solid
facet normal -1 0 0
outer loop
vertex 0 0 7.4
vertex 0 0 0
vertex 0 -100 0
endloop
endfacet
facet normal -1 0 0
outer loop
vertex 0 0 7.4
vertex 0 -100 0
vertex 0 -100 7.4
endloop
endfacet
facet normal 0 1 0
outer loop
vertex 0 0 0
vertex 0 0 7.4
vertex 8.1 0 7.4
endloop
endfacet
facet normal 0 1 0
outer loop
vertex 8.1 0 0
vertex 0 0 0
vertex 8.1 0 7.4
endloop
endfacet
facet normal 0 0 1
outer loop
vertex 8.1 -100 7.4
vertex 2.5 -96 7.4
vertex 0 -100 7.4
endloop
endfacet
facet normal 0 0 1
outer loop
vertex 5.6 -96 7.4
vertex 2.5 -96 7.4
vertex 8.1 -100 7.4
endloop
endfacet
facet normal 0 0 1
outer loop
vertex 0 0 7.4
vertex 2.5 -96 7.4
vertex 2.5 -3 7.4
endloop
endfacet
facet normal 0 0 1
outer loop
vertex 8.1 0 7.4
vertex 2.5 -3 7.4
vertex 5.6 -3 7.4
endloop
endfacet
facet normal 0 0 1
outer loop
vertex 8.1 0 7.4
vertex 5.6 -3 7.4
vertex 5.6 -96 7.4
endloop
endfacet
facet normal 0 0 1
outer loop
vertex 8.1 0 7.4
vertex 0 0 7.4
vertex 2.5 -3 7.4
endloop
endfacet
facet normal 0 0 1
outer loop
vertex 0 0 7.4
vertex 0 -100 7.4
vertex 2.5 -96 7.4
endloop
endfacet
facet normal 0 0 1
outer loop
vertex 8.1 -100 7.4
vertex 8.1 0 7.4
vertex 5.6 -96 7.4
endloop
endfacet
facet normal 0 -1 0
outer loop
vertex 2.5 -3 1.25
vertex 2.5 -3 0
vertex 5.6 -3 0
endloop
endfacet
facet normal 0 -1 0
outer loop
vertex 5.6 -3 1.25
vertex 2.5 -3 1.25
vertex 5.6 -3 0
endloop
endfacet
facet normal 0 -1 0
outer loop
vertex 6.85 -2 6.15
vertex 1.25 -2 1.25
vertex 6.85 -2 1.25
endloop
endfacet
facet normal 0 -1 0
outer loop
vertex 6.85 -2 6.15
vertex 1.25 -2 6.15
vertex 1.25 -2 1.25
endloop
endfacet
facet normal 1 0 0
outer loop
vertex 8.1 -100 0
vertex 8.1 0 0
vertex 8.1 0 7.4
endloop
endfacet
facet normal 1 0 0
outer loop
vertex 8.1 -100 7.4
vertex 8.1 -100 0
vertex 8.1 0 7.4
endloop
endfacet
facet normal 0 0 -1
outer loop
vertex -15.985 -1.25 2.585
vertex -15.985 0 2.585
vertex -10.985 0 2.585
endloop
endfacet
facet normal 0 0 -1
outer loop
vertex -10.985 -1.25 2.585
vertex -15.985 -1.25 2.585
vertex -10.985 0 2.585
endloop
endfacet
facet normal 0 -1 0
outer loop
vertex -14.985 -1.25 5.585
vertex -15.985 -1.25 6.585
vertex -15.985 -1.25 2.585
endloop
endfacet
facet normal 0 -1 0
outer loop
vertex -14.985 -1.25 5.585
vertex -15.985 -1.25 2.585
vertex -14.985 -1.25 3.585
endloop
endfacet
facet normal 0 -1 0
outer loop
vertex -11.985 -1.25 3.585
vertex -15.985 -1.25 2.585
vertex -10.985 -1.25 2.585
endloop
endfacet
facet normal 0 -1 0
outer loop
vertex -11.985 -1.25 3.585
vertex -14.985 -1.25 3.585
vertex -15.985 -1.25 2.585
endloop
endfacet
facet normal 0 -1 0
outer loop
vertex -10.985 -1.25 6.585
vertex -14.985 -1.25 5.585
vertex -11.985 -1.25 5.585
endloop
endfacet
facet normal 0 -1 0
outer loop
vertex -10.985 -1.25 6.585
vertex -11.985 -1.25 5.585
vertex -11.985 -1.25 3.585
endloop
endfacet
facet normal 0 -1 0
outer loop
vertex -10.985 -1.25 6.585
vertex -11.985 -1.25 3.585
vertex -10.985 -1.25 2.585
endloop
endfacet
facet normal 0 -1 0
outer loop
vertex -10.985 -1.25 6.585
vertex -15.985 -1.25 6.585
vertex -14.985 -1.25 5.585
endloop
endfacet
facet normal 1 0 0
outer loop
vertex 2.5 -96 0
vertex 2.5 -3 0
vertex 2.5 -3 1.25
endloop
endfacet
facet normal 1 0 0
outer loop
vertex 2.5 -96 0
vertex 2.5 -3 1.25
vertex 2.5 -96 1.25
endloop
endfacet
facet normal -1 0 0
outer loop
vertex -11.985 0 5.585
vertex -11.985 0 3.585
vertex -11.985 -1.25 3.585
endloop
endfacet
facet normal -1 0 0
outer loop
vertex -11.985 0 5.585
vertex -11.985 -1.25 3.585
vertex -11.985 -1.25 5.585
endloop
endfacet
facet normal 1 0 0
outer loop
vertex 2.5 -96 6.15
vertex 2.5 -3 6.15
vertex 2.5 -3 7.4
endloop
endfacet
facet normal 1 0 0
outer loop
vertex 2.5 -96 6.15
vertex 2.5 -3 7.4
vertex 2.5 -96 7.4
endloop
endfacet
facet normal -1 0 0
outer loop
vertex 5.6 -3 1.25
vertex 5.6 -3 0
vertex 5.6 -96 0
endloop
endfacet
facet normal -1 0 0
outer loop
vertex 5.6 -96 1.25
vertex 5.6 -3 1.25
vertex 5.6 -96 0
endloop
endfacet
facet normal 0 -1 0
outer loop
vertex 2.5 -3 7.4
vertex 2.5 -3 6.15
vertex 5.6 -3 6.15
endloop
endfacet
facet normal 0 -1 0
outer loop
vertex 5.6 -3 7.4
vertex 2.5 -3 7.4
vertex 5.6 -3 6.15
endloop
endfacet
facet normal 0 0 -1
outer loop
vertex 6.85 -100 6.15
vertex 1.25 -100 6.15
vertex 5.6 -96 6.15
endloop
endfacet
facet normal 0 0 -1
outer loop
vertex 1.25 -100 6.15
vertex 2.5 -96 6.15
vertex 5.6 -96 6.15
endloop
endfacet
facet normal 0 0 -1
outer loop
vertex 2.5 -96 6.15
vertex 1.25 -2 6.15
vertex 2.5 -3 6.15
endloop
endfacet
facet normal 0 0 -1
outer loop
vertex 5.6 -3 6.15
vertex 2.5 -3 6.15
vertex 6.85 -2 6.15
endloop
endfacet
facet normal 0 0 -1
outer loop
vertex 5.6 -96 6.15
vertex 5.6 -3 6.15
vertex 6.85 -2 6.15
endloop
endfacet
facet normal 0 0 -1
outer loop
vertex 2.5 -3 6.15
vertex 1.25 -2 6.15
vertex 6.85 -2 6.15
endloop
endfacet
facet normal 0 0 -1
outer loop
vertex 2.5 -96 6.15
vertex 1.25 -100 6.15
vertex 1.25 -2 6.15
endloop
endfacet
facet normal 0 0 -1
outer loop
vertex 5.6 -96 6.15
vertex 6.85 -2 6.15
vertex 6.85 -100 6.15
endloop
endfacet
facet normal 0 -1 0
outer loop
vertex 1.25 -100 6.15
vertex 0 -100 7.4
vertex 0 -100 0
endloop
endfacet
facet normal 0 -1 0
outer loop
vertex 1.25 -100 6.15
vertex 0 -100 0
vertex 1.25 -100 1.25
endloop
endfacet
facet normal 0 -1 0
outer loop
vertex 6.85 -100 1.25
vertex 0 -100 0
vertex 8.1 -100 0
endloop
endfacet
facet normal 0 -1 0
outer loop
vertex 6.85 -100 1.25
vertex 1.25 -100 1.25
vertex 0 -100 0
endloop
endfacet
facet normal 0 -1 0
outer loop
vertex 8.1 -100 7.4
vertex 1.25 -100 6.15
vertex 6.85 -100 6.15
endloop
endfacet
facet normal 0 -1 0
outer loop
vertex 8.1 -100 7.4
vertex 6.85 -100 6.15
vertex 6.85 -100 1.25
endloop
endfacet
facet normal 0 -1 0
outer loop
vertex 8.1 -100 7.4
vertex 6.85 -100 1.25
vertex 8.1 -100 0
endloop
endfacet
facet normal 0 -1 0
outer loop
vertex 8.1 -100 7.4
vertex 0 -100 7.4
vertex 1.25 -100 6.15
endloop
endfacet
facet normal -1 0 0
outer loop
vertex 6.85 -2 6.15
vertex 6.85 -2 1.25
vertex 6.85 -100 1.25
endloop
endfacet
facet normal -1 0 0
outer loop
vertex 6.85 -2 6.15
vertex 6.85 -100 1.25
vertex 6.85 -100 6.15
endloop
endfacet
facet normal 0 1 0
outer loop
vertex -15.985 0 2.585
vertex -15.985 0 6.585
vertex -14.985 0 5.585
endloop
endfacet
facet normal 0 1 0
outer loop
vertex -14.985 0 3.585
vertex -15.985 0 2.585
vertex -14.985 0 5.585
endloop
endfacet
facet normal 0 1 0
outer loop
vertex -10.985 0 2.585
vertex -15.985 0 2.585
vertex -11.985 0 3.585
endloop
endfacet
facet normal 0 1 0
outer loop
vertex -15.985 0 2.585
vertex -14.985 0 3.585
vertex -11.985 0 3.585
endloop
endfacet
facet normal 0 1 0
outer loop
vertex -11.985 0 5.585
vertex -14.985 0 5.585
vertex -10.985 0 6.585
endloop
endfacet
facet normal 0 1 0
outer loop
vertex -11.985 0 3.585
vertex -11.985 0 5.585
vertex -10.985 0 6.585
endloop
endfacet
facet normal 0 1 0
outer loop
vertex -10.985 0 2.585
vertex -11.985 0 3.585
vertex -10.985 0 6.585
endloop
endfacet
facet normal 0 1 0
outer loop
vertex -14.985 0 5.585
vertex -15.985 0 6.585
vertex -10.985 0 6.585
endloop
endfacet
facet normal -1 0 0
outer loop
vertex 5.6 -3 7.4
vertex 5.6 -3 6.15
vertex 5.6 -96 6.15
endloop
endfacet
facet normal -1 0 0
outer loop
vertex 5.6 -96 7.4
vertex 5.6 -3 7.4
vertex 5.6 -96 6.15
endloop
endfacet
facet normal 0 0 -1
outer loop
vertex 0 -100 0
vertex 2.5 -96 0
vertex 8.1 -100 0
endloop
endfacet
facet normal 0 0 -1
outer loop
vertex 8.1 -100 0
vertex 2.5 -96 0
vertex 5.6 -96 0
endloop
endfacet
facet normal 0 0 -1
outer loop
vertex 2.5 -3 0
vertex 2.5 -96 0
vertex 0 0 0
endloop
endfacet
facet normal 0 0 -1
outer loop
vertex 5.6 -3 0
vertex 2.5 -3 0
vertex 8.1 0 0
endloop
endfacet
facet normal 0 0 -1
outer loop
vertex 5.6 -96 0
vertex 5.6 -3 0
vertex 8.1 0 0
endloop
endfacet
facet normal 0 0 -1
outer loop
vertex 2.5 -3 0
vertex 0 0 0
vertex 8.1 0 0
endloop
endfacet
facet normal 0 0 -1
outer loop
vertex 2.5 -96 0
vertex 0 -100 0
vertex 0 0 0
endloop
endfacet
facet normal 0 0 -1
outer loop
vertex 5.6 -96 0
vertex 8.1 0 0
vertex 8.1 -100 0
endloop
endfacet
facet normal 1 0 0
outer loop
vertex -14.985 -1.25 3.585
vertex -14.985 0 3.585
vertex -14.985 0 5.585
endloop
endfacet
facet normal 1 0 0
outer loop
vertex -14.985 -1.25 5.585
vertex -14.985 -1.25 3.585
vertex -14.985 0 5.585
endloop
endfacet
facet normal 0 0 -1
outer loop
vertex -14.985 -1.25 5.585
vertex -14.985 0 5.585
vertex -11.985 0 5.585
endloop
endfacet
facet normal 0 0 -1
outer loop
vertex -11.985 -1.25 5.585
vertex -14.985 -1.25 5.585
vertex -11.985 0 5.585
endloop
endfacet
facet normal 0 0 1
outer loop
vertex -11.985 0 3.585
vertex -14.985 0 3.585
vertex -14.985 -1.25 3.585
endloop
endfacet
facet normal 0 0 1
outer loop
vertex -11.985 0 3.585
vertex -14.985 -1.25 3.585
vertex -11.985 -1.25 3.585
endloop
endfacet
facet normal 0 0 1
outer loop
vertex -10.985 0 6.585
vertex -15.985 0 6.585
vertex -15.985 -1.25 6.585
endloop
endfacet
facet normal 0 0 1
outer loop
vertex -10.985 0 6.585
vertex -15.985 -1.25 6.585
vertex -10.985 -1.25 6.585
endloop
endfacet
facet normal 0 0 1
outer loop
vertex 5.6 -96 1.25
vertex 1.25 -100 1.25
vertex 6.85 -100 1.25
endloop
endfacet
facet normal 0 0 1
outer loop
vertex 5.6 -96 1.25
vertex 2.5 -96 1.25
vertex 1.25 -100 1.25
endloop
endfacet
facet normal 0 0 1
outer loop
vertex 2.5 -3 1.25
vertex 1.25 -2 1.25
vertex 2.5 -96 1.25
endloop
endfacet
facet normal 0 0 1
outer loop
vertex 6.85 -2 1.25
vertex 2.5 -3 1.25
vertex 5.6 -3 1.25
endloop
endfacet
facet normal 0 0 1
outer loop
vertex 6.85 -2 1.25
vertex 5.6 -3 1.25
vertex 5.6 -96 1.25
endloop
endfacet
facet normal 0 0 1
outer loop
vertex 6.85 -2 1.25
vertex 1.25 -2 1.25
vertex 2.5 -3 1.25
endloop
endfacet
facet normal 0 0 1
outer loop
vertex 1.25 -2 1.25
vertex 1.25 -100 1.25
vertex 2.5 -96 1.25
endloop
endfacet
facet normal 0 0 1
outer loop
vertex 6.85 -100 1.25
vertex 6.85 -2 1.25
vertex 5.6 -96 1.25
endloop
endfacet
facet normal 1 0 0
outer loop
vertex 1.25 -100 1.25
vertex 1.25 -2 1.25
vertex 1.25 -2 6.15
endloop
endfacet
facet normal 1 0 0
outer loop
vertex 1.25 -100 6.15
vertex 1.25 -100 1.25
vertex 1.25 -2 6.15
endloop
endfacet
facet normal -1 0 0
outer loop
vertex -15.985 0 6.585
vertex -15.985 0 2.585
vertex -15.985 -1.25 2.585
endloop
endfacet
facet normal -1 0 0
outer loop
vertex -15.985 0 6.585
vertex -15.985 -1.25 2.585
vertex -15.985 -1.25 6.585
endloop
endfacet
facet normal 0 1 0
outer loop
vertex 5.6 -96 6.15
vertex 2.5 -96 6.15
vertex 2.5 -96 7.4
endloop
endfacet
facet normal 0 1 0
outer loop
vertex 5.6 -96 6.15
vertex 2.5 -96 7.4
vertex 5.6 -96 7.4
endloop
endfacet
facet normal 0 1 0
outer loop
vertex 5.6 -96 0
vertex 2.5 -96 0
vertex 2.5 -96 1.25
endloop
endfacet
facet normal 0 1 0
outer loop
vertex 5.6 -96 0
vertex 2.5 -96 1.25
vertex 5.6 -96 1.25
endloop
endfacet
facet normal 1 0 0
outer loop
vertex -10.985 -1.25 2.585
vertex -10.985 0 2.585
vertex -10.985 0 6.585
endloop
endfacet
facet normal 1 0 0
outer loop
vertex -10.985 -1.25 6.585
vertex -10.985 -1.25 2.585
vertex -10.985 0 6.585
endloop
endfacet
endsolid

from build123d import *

# Parameters (mm, degrees)
F0_W     = 8.1
F0_H     = 7.4
F0_W_2   = 5.6
F0_H_2   = 4.9
F1_DEPTH = 2
F2_DEPTH = 100
F3_W     = 3.1
F3_H     = 93
F4_DEPTH = 25
F6_W     = 5
F6_H     = 4
F6_W_2   = 3
F6_H_2   = 2
F7_DEPTH = 1.25


with BuildPart() as f1:
    # F0 (on Front) → F1 (new body)
    with BuildSketch(Plane.XZ):
        with Locations((4.05, 3.7)):
            Rectangle(F0_W, F0_H)
        with Locations((4.05, 3.7)):
            Rectangle(F0_W_2, F0_H_2, mode=Mode.SUBTRACT)
        with Locations((4.05, 3.7)):
            Rectangle(F0_W_2, F0_H_2)
    extrude(amount=F1_DEPTH)

    # F0 (on Front) → F2 (join)
    with BuildSketch(Plane.XZ):
        with Locations((4.05, 3.7)):
            Rectangle(F0_W, F0_H)
        with Locations((4.05, 3.7)):
            Rectangle(F0_W_2, F0_H_2, mode=Mode.SUBTRACT)
    extrude(amount=F2_DEPTH)

    # F3 (on face) → F4 (cut)
    with BuildSketch(Plane(origin=(0, 0, 0), x_dir=(1, 0, 0), z_dir=(0, 0, -1))):
        with Locations((4.05, 49.5)):
            Rectangle(F3_W, F3_H)
    extrude(amount=-F4_DEPTH, mode=Mode.SUBTRACT)


with BuildPart() as f7:
    # F6 (on Front) → F7 (new body)
    with BuildSketch(Plane.XZ):
        with Locations((-13.484615, 4.584615)):
            Rectangle(F6_W, F6_H)
        with Locations((-13.484615, 4.584615)):
            Rectangle(F6_W_2, F6_H_2, mode=Mode.SUBTRACT)
    extrude(amount=F7_DEPTH)


solid = Compound([f1.part, f7.part])
